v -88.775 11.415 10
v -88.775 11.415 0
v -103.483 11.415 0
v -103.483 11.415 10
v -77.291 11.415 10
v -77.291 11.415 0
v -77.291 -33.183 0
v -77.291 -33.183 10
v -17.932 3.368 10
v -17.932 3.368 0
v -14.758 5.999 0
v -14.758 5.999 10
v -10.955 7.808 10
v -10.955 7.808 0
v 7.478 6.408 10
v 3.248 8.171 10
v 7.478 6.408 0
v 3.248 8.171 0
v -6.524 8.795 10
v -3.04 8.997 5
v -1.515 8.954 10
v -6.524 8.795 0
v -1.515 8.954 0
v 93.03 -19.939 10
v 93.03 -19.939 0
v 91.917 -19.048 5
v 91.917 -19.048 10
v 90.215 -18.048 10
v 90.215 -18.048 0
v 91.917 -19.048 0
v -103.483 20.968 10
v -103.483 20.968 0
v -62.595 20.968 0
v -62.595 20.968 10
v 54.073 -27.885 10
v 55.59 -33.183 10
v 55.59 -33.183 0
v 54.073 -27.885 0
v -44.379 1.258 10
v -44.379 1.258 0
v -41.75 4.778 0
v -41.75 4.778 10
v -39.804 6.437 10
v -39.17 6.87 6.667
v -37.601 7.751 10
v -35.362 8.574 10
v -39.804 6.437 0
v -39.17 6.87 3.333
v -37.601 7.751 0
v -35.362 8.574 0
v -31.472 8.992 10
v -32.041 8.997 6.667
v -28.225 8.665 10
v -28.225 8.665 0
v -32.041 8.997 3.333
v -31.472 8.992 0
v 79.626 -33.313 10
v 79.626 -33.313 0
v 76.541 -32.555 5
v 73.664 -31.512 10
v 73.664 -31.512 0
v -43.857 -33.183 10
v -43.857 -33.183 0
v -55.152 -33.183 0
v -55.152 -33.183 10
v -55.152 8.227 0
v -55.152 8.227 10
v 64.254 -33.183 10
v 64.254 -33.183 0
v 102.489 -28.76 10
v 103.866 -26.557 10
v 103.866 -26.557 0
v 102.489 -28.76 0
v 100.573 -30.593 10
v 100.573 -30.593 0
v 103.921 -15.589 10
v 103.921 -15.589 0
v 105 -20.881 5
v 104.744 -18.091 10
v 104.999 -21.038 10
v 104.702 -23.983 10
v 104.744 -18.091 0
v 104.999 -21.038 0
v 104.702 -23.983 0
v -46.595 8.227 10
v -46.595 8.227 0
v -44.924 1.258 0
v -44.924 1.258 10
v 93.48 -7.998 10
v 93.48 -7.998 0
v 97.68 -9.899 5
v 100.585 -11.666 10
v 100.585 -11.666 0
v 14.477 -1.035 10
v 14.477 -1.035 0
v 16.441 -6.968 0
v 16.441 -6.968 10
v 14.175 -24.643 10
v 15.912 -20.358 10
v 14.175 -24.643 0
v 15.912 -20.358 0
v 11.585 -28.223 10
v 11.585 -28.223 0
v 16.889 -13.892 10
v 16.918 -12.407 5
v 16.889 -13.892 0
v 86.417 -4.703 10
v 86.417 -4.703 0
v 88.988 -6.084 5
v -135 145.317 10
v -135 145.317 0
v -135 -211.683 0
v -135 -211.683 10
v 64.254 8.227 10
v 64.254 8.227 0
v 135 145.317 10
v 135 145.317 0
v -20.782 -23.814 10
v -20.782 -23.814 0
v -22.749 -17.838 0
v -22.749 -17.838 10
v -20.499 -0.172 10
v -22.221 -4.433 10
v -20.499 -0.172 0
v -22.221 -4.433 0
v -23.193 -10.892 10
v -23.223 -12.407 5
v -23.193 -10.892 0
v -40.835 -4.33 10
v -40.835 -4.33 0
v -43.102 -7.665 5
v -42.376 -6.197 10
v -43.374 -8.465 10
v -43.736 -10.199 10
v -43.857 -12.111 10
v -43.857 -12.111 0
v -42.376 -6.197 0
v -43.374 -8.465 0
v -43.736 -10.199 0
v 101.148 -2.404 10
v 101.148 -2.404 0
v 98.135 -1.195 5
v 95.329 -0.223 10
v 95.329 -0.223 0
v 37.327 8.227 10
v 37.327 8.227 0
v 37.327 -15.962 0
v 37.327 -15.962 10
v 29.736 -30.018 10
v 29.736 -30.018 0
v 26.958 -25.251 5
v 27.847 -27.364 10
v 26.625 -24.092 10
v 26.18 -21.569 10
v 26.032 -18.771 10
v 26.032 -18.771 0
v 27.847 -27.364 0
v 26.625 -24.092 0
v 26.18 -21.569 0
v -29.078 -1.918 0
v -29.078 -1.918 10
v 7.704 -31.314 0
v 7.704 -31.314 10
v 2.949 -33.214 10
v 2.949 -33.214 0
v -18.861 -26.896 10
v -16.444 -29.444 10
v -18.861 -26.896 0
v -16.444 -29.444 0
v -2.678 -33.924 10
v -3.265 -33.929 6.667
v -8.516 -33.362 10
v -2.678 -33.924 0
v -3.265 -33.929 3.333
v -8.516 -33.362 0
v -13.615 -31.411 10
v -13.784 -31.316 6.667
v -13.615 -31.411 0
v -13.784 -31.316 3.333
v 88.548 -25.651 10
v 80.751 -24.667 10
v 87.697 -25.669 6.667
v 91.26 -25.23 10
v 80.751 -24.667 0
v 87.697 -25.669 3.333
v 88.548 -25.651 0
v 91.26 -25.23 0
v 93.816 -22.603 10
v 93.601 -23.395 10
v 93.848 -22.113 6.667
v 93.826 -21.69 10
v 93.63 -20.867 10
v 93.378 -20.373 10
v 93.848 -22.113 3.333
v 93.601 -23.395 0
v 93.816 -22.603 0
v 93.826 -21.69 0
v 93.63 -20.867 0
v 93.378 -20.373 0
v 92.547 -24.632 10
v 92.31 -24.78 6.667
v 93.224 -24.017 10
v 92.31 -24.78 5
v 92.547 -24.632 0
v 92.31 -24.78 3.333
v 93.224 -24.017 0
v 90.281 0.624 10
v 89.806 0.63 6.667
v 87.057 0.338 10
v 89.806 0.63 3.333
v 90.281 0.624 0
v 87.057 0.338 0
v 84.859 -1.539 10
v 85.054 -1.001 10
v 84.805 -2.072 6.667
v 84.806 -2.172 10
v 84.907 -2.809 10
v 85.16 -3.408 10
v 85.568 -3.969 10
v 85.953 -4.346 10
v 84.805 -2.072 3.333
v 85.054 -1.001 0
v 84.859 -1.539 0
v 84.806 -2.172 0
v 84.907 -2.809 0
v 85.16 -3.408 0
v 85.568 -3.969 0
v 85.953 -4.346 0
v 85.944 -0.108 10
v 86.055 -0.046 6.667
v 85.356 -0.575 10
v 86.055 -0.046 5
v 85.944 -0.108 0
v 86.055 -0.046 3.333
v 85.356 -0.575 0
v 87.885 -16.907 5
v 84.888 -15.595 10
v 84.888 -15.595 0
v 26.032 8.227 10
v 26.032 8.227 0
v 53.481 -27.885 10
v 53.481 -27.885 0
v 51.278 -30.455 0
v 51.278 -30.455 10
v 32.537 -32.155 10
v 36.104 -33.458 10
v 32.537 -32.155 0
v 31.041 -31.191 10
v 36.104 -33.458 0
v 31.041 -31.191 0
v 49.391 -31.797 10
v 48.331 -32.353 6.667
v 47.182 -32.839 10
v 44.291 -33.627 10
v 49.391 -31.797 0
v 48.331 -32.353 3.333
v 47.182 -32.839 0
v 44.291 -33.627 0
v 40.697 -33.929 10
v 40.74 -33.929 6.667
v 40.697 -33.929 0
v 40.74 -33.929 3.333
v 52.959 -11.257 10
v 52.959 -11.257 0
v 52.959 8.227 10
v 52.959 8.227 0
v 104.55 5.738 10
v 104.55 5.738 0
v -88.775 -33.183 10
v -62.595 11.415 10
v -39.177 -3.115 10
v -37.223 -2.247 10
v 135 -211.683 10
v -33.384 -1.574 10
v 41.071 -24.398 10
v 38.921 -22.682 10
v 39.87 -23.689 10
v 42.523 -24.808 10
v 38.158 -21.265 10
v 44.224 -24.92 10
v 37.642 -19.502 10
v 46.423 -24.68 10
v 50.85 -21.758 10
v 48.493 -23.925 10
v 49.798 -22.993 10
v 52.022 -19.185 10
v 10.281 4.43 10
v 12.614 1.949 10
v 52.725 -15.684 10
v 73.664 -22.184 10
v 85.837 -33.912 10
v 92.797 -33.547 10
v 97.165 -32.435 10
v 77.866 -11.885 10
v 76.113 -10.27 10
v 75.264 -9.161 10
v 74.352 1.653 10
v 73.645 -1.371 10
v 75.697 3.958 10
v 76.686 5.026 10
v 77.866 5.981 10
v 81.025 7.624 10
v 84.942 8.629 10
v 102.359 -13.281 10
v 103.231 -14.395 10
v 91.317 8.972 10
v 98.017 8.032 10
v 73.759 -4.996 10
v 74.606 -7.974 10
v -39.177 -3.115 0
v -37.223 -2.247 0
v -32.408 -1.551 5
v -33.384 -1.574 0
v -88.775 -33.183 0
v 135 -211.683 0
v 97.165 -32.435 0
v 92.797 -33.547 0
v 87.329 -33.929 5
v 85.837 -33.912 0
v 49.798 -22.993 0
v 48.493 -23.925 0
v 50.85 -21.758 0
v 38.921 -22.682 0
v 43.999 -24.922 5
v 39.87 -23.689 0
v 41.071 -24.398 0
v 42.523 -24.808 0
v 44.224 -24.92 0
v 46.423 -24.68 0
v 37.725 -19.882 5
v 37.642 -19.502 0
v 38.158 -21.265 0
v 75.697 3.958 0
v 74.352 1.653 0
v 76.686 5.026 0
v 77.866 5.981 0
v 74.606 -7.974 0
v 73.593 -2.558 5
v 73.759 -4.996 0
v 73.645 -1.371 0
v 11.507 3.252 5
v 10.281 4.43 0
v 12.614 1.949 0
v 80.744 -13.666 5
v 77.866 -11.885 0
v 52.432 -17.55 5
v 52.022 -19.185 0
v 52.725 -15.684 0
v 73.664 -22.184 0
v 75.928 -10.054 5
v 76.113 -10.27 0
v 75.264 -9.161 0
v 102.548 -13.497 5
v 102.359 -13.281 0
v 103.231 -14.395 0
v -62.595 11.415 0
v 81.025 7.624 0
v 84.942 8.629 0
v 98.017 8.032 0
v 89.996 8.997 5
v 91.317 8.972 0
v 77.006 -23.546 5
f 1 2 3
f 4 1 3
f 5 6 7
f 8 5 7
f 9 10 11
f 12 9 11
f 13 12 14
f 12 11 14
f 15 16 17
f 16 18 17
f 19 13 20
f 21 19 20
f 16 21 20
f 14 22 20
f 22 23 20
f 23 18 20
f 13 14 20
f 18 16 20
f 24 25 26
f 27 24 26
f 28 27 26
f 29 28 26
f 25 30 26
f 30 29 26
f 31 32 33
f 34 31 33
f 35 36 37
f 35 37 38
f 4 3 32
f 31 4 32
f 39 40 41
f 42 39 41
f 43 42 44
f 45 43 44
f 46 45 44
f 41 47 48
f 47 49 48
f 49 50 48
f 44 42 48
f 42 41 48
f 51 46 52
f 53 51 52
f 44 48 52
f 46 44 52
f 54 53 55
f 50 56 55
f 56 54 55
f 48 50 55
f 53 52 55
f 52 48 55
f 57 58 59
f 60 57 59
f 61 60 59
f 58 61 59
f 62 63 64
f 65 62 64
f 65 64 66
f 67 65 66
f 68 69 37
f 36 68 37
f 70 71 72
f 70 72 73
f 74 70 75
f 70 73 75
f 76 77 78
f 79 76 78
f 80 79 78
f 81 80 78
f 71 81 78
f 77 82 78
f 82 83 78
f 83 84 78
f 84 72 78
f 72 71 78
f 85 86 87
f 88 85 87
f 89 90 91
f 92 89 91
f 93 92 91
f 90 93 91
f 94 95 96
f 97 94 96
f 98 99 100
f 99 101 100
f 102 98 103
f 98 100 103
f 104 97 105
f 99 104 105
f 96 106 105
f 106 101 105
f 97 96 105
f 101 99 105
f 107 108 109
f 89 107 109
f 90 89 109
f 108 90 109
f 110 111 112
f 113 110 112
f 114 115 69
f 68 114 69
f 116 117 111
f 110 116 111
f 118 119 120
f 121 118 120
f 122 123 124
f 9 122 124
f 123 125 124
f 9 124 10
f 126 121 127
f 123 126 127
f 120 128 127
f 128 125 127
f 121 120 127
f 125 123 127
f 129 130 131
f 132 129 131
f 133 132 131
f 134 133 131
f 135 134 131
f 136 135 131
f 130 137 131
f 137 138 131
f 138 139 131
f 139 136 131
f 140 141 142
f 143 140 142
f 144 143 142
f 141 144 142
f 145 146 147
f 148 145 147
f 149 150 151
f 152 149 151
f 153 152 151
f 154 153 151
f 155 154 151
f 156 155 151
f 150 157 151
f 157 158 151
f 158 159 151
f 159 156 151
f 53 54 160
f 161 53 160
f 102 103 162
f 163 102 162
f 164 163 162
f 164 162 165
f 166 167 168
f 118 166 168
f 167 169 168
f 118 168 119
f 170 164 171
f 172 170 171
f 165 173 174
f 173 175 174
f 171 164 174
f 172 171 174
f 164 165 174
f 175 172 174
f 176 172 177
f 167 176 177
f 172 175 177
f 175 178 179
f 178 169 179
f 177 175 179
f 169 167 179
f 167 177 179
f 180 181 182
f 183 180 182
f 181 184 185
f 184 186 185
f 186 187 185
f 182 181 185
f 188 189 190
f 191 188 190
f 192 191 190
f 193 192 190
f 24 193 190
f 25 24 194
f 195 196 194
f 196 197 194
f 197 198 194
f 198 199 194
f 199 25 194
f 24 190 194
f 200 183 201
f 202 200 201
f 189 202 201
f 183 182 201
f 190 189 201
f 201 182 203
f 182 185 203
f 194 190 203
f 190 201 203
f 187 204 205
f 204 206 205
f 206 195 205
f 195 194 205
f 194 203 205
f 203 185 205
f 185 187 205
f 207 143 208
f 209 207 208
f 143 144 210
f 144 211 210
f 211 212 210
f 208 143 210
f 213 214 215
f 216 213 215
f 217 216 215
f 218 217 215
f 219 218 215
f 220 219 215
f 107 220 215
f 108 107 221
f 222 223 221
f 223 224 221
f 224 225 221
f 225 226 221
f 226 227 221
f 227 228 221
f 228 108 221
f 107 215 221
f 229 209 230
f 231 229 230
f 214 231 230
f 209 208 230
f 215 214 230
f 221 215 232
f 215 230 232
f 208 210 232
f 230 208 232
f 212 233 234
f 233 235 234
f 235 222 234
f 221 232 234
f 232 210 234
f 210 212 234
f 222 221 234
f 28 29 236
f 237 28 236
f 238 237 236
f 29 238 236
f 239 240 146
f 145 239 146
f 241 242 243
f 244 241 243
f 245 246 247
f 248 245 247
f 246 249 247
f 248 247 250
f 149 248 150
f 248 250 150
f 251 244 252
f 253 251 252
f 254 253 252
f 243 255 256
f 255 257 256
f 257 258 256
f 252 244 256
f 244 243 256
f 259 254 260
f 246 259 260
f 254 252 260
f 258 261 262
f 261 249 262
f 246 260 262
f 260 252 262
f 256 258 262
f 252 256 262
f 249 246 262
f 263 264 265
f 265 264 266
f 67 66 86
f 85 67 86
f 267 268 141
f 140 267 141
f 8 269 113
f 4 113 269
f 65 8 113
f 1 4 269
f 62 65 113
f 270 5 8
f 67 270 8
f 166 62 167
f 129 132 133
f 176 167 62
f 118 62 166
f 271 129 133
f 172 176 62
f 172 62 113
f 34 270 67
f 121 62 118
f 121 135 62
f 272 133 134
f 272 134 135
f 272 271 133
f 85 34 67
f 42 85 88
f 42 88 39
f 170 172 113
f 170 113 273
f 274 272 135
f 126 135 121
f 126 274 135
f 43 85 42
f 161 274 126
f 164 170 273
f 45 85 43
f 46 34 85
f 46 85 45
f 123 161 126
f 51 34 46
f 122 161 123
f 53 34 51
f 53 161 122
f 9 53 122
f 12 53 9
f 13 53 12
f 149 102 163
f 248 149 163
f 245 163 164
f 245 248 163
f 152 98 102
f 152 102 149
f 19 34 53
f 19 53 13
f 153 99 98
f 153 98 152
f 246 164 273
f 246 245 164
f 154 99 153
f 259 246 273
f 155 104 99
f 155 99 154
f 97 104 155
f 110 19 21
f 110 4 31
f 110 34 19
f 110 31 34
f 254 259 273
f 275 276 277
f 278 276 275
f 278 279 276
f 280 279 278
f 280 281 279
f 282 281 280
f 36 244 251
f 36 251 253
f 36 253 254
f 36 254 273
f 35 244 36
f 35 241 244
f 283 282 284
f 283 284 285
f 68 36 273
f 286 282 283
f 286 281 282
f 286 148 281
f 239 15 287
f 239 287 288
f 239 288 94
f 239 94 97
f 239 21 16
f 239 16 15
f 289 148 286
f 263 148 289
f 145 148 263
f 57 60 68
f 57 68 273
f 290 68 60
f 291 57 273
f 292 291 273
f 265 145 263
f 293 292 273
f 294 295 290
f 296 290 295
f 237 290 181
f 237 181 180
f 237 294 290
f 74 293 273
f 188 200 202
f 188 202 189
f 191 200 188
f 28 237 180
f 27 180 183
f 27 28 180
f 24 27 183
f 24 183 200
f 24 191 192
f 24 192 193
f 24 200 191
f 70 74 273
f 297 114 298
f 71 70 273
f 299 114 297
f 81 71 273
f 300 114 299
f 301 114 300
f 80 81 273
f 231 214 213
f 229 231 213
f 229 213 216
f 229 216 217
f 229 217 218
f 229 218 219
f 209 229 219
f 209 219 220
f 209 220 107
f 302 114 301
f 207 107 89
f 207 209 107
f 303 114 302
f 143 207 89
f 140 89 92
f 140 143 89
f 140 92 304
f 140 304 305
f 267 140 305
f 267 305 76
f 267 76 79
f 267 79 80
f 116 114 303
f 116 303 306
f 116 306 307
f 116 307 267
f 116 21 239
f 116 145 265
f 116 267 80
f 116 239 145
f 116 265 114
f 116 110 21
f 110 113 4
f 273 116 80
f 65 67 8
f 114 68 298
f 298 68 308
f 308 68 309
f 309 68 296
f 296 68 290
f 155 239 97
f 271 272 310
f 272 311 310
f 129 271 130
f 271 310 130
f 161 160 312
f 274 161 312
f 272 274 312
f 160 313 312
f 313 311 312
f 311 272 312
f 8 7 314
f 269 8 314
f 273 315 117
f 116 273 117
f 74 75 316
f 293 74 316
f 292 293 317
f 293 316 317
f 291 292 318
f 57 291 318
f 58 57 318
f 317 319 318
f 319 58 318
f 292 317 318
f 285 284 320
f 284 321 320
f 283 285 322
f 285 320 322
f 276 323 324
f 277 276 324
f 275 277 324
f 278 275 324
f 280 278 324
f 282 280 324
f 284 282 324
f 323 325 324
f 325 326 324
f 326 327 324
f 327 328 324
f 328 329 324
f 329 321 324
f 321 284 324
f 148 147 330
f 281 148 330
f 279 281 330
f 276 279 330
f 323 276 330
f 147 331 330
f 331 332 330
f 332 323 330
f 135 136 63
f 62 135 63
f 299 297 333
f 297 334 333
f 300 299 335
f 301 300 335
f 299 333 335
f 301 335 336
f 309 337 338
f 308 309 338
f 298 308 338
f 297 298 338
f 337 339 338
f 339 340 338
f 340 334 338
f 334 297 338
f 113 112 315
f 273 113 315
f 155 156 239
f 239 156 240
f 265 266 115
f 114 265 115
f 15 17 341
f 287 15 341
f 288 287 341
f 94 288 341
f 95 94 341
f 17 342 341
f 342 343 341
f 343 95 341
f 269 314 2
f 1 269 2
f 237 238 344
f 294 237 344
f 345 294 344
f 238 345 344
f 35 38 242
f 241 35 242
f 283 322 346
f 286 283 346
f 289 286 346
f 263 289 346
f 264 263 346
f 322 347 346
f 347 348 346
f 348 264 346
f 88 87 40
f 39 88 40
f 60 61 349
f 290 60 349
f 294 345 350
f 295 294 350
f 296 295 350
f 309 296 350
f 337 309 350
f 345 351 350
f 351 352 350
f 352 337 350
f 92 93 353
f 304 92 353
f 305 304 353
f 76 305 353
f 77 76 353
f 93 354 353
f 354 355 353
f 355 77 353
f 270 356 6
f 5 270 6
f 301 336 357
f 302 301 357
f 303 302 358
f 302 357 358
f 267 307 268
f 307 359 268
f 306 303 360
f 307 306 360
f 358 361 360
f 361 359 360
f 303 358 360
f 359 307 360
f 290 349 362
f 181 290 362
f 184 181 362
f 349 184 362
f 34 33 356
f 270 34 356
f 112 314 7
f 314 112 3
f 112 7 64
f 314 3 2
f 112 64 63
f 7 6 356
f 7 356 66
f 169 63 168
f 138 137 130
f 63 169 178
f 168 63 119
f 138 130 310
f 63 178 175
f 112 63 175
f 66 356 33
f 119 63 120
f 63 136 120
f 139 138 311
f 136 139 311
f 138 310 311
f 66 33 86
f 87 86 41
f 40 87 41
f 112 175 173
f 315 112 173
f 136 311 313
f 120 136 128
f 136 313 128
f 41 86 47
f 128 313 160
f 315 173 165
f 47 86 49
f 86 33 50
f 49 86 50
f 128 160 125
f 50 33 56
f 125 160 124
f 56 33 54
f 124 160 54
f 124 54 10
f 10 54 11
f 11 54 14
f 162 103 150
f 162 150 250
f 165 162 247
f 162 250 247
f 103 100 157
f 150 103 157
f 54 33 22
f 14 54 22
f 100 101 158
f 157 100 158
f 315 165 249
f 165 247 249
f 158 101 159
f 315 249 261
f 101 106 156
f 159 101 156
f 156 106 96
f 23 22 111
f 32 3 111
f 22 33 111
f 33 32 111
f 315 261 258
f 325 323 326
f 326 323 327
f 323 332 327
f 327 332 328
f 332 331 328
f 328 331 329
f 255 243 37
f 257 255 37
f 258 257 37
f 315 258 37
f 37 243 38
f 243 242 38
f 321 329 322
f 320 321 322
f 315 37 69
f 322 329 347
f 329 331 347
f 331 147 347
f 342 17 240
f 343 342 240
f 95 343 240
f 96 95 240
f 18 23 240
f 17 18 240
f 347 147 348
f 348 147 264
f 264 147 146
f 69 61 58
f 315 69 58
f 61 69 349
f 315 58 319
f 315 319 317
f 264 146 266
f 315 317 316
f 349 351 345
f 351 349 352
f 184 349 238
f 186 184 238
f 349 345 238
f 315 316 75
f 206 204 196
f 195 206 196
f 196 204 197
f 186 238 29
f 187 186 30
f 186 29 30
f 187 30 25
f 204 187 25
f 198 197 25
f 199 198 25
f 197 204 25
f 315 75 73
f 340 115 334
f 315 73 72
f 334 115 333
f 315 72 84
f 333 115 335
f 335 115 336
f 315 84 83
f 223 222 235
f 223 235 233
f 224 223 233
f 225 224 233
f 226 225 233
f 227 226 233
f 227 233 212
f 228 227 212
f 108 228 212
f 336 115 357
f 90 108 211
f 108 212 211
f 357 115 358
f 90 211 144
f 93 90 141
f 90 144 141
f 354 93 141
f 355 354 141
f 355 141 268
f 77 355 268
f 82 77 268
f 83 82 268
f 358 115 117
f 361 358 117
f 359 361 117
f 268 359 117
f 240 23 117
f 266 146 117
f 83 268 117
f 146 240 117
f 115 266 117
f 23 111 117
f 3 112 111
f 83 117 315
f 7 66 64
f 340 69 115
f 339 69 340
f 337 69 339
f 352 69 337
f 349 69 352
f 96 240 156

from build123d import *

# Parameters (mm, degrees)
F1_DEPTH = 10


# Not quite as in the source:
# - a feature names something its author has since deleted; it is built from what else it names


with BuildPart() as f1:
    # F0 (on Top) → F1 (new body)
    with BuildSketch(Plane.XY):
        Polygon((-135, 145.3171813515), (-135, -111.8657903795), (-105, -111.8657903795), (-105, 115.3171813515), (0, 115.3171813515), (0, 145.3171813515), align=None)
        Polygon((81.1492523154, -181.6828186485), (81.1492523154, -211.6828186485), (135, -211.6828186485), (135, -33.1828186485), (105, -33.1828186485), (105, -181.6828186485), align=None)
        Polygon((105, -33.1828186485), (135, -33.1828186485), (135, 145.3171813515), (0, 145.3171813515), (0, 115.3171813515), (105, 115.3171813515), (105, -20.8807700001), align=None)
        Polygon((-135, -111.8657903795), (-135, -211.6828186485), (81.1492523154, -211.6828186485), (81.1492523154, -181.6828186485), (-105, -181.6828186485), (-105, -111.8657903795), align=None)
        Polygon((-105, -181.6828186485), (81.1492523154, -181.6828186485), (105, -181.6828186485), (105, -33.1828186485), (105, -20.8807700001), (105, 115.3171813515), (0, 115.3171813515), (-105, 115.3171813515), (-105, -111.8657903795), align=None)
        Polygon((-77.2907613296, 11.4150706229), (-77.2907613296, -33.1828186485), (-88.7750437384, -33.1828186485), (-88.7750437384, 11.4150706229), (-103.4829843671, 11.4150706229), (-103.4829843671, 20.9675284366), (-62.5946723856, 20.9675284366), (-62.5946723856, 11.4150706229), align=None, mode=Mode.SUBTRACT)
        with BuildLine():
            add(Edge.make_bspline(
                [(-39.1698177098, 6.8699495664), (-35.892826909, 8.9973269579), (-32.0410294035, 8.9973269579)],
                knots=[0, 0, 0, 1, 1, 1], degree=2))
            add(Edge.make_bspline(
                [(-32.0410294035, 8.9973269579), (-29.7418025848, 8.9973269579), (-28.2247869519, 8.6654797882)],
                knots=[0, 0, 0, 1, 1, 1], degree=2))
            Line((-28.2247869519, 8.6654797882), (-29.0781082454, -1.9180745884))
            add(Edge.make_bspline(
                [(-29.0781082454, -1.9180745884), (-30.4529036627, -1.5506723648), (-32.4084316271, -1.5506723648)],
                knots=[0, 0, 0, 1, 1, 1], degree=2))
            add(Edge.make_bspline(
                [(-32.4084316271, -1.5506723648), (-37.8127998194, -1.5506723648), (-40.8349794006, -4.3298924111)],
                knots=[0, 0, 0, 1, 1, 1], degree=2))
            add(Edge.make_bspline(
                [(-40.8349794006, -4.3298924111), (-43.8571589819, -7.1091124574), (-43.8571589819, -12.1105233722)],
                knots=[0, 0, 0, 1, 1, 1], degree=2))
            Line((-43.8571589819, -12.1105233722), (-43.8571589819, -33.1828186485))
            Line((-43.8571589819, -33.1828186485), (-55.1518144365, -33.1828186485))
            Line((-55.1518144365, -33.1828186485), (-55.1518144365, 8.2269674568))
            Line((-55.1518144365, 8.2269674568), (-46.5948981319, 8.2269674568))
            Line((-46.5948981319, 8.2269674568), (-44.9238105988, 1.258176893))
            Line((-44.9238105988, 1.258176893), (-44.3786331057, 1.258176893))
            add(Edge.make_bspline(
                [(-44.3786331057, 1.258176893), (-42.4468085106, 4.7425721749), (-39.1698177098, 6.8699495664)],
                knots=[0, 0, 0, 1, 1, 1], degree=2))
        make_face(mode=Mode.SUBTRACT)
        with BuildLine():
            add(Edge.make_bspline(
                [(14.4768327784, -1.0351240833), (16.9182798126, -5.8883889403), (16.9182798126, -12.406815488)],
                knots=[0, 0, 0, 1, 1, 1], degree=2))
            add(Edge.make_bspline(
                [(16.9182798126, -12.406815488), (16.9182798126, -22.5163024794), (11.5850217281, -28.2228886299)],
                knots=[0, 0, 0, 1, 1, 1], degree=2))
            add(Edge.make_bspline(
                [(11.5850217281, -28.2228886299), (6.2517636435, -33.9294747803), (-3.2651391162, -33.9294747803)],
                knots=[0, 0, 0, 1, 1, 1], degree=2))
            add(Edge.make_bspline(
                [(-3.2651391162, -33.9294747803), (-9.2265364863, -33.9294747803), (-13.7835092274, -31.3161783189)],
                knots=[0, 0, 0, 1, 1, 1], degree=2))
            add(Edge.make_bspline(
                [(-13.7835092274, -31.3161783189), (-18.3404819685, -28.7028818575), (-20.7819290028, -23.8140619466)],
                knots=[0, 0, 0, 1, 1, 1], degree=2))
            add(Edge.make_bspline(
                [(-20.7819290028, -23.8140619466), (-23.223376037, -18.9252420358), (-23.223376037, -12.406815488)],
                knots=[0, 0, 0, 1, 1, 1], degree=2))
            add(Edge.make_bspline(
                [(-23.223376037, -12.406815488), (-23.223376037, -2.2617734428), (-17.9315988487, 3.3677767576)],
                knots=[0, 0, 0, 1, 1, 1], degree=2))
            add(Edge.make_bspline(
                [(-17.9315988487, 3.3677767576), (-12.6398216604, 8.9973269579), (-3.0399571082, 8.9973269579)],
                knots=[0, 0, 0, 1, 1, 1], degree=2))
            add(Edge.make_bspline(
                [(-3.0399571082, 8.9973269579), (2.9214402619, 8.9973269579), (7.478413003, 6.4077338658)],
                knots=[0, 0, 0, 1, 1, 1], degree=2))
            add(Edge.make_bspline(
                [(7.478413003, 6.4077338658), (12.0353857441, 3.8181407736), (14.4768327784, -1.0351240833)],
                knots=[0, 0, 0, 1, 1, 1], degree=2))
        make_face(mode=Mode.SUBTRACT)
        with BuildLine():
            Line((64.2539082341, -33.1828186485), (55.5903267679, -33.1828186485))
            Line((55.5903267679, -33.1828186485), (54.0733111349, -27.8851156178))
            Line((54.0733111349, -27.8851156178), (53.4807269033, -27.8851156178))
            add(Edge.make_bspline(
                [(53.4807269033, -27.8851156178), (51.6674191546, -30.7769266681), (48.3311699306, -32.3532007242)],
                knots=[0, 0, 0, 1, 1, 1], degree=2))
            add(Edge.make_bspline(
                [(48.3311699306, -32.3532007242), (44.9949207066, -33.9294747803), (40.7401659236, -33.9294747803)],
                knots=[0, 0, 0, 1, 1, 1], degree=2))
            add(Edge.make_bspline(
                [(40.7401659236, -33.9294747803), (33.4395281901, -33.9294747803), (29.7358767425, -30.0184188517)],
                knots=[0, 0, 0, 1, 1, 1], degree=2))
            add(Edge.make_bspline(
                [(29.7358767425, -30.0184188517), (26.0322252949, -26.107362923), (26.0322252949, -18.7711701356)],
                knots=[0, 0, 0, 1, 1, 1], degree=2))
            Line((26.0322252949, -18.7711701356), (26.0322252949, 8.2269674568))
            Line((26.0322252949, 8.2269674568), (37.3268807495, 8.2269674568))
            Line((37.3268807495, 8.2269674568), (37.3268807495, -15.9623208777))
            add(Edge.make_bspline(
                [(37.3268807495, -15.9623208777), (37.3268807495, -20.4422576688), (38.9209323325, -22.6822260643)],
                knots=[0, 0, 0, 1, 1, 1], degree=2))
            add(Edge.make_bspline(
                [(38.9209323325, -22.6822260643), (40.5149839156, -24.9221944598), (43.9993791975, -24.9221944598)],
                knots=[0, 0, 0, 1, 1, 1], degree=2))
            add(Edge.make_bspline(
                [(43.9993791975, -24.9221944598), (48.7400530504, -24.9221944598), (50.8496529149, -21.7577946629)],
                knots=[0, 0, 0, 1, 1, 1], degree=2))
            add(Edge.make_bspline(
                [(50.8496529149, -21.7577946629), (52.9592527795, -18.5933948661), (52.9592527795, -11.2572020787)],
                knots=[0, 0, 0, 1, 1, 1], degree=2))
            Line((52.9592527795, -11.2572020787), (52.9592527795, 8.2269674568))
            Line((52.9592527795, 8.2269674568), (64.2539082341, 8.2269674568))
            Line((64.2539082341, 8.2269674568), (64.2539082341, -33.1828186485))
        make_face(mode=Mode.SUBTRACT)
        with BuildLine():
            add(Edge.make_bspline(
                [(103.9214966985, -15.5889928118), (105, -17.8111836804), (105, -20.8807700001)],
                knots=[0, 0, 0, 1, 1, 1], degree=2))
            add(Edge.make_bspline(
                [(105, -20.8807700001), (105, -27.2569763323), (100.5733957898, -30.5932255563)],
                knots=[0, 0, 0, 1, 1, 1], degree=2))
            add(Edge.make_bspline(
                [(100.5733957898, -30.5932255563), (96.1467915797, -33.9294747803), (87.3291382132, -33.9294747803)],
                knots=[0, 0, 0, 1, 1, 1], degree=2))
            add(Edge.make_bspline(
                [(87.3291382132, -33.9294747803), (82.8136463683, -33.9294747803), (79.6255432022, -33.3131871794)],
                knots=[0, 0, 0, 1, 1, 1], degree=2))
            add(Edge.make_bspline(
                [(79.6255432022, -33.3131871794), (76.4374400361, -32.6968995786), (73.6641458322, -31.5117311153)],
                knots=[0, 0, 0, 1, 1, 1], degree=2))
            Line((73.6641458322, -31.5117311153), (73.6641458322, -22.1844553097))
            add(Edge.make_bspline(
                [(73.6641458322, -22.1844553097), (76.8048422597, -23.6659158887), (80.7514532423, -24.6673832402)],
                knots=[0, 0, 0, 1, 1, 1], degree=2))
            add(Edge.make_bspline(
                [(80.7514532423, -24.6673832402), (84.6980642248, -25.6688505916), (87.6965404368, -25.6688505916)],
                knots=[0, 0, 0, 1, 1, 1], degree=2))
            add(Edge.make_bspline(
                [(87.6965404368, -25.6688505916), (93.847564761, -25.6688505916), (93.847564761, -22.1133452019)],
                knots=[0, 0, 0, 1, 1, 1], degree=2))
            add(Edge.make_bspline(
                [(93.847564761, -22.1133452019), (93.847564761, -20.7741048385), (93.0297985214, -19.9385610719)],
                knots=[0, 0, 0, 1, 1, 1], degree=2))
            add(Edge.make_bspline(
                [(93.0297985214, -19.9385610719), (92.2120322817, -19.1030173053), (90.2150234212, -18.048217373)],
                knots=[0, 0, 0, 1, 1, 1], degree=2))
            add(Edge.make_bspline(
                [(90.2150234212, -18.048217373), (88.2180145606, -16.9934174408), (84.887691179, -15.5949186541)],
                knots=[0, 0, 0, 1, 1, 1], degree=2))
            add(Edge.make_bspline(
                [(84.887691179, -15.5949186541), (80.1114622721, -13.5919839513), (77.8655680343, -11.8853413642)],
                knots=[0, 0, 0, 1, 1, 1], degree=2))
            add(Edge.make_bspline(
                [(77.8655680343, -11.8853413642), (75.6196737965, -10.1786987772), (74.6063547604, -7.9742854356)],
                knots=[0, 0, 0, 1, 1, 1], degree=2))
            add(Edge.make_bspline(
                [(74.6063547604, -7.9742854356), (73.5930357244, -5.7698720939), (73.5930357244, -2.5580655586)],
                knots=[0, 0, 0, 1, 1, 1], degree=2))
            add(Edge.make_bspline(
                [(73.5930357244, -2.5580655586), (73.5930357244, 2.9648194801), (77.8655680343, 5.981073219)],
                knots=[0, 0, 0, 1, 1, 1], degree=2))
            add(Edge.make_bspline(
                [(77.8655680343, 5.981073219), (82.1381003443, 8.9973269579), (89.9957672555, 8.9973269579)],
                knots=[0, 0, 0, 1, 1, 1], degree=2))
            add(Edge.make_bspline(
                [(89.9957672555, 8.9973269579), (97.4741802585, 8.9973269579), (104.549635984, 5.738113684)],
                knots=[0, 0, 0, 1, 1, 1], degree=2))
            Line((104.549635984, 5.738113684), (101.1482024945, -2.4039936584))
            add(Edge.make_bspline(
                [(101.1482024945, -2.4039936584), (98.0312094362, -1.0766049796), (95.32902534, -0.223283686)],
                knots=[0, 0, 0, 1, 1, 1], degree=2))
            add(Edge.make_bspline(
                [(95.32902534, -0.223283686), (92.6268412439, 0.6300376075), (89.8061403014, 0.6300376075)],
                knots=[0, 0, 0, 1, 1, 1], degree=2))
            add(Edge.make_bspline(
                [(89.8061403014, 0.6300376075), (84.8047293865, 0.6300376075), (84.8047293865, -2.0721464887)],
                knots=[0, 0, 0, 1, 1, 1], degree=2))
            add(Edge.make_bspline(
                [(84.8047293865, -2.0721464887), (84.8047293865, -3.5891621216), (86.4165584965, -4.703220477)],
                knots=[0, 0, 0, 1, 1, 1], degree=2))
            add(Edge.make_bspline(
                [(86.4165584965, -4.703220477), (88.0283876065, -5.8172788325), (93.4801625374, -7.9979888048)],
                knots=[0, 0, 0, 1, 1, 1], degree=2))
            add(Edge.make_bspline(
                [(93.4801625374, -7.9979888048), (98.327501552, -9.9653684538), (100.5852474745, -11.6660851985)],
                knots=[0, 0, 0, 1, 1, 1], degree=2))
            add(Edge.make_bspline(
                [(100.5852474745, -11.6660851985), (102.8429933969, -13.3668019433), (103.9214966985, -15.5889928118)],
                knots=[0, 0, 0, 1, 1, 1], degree=2))
        make_face(mode=Mode.SUBTRACT)
    extrude(amount=F1_DEPTH)


solid = f1.part
